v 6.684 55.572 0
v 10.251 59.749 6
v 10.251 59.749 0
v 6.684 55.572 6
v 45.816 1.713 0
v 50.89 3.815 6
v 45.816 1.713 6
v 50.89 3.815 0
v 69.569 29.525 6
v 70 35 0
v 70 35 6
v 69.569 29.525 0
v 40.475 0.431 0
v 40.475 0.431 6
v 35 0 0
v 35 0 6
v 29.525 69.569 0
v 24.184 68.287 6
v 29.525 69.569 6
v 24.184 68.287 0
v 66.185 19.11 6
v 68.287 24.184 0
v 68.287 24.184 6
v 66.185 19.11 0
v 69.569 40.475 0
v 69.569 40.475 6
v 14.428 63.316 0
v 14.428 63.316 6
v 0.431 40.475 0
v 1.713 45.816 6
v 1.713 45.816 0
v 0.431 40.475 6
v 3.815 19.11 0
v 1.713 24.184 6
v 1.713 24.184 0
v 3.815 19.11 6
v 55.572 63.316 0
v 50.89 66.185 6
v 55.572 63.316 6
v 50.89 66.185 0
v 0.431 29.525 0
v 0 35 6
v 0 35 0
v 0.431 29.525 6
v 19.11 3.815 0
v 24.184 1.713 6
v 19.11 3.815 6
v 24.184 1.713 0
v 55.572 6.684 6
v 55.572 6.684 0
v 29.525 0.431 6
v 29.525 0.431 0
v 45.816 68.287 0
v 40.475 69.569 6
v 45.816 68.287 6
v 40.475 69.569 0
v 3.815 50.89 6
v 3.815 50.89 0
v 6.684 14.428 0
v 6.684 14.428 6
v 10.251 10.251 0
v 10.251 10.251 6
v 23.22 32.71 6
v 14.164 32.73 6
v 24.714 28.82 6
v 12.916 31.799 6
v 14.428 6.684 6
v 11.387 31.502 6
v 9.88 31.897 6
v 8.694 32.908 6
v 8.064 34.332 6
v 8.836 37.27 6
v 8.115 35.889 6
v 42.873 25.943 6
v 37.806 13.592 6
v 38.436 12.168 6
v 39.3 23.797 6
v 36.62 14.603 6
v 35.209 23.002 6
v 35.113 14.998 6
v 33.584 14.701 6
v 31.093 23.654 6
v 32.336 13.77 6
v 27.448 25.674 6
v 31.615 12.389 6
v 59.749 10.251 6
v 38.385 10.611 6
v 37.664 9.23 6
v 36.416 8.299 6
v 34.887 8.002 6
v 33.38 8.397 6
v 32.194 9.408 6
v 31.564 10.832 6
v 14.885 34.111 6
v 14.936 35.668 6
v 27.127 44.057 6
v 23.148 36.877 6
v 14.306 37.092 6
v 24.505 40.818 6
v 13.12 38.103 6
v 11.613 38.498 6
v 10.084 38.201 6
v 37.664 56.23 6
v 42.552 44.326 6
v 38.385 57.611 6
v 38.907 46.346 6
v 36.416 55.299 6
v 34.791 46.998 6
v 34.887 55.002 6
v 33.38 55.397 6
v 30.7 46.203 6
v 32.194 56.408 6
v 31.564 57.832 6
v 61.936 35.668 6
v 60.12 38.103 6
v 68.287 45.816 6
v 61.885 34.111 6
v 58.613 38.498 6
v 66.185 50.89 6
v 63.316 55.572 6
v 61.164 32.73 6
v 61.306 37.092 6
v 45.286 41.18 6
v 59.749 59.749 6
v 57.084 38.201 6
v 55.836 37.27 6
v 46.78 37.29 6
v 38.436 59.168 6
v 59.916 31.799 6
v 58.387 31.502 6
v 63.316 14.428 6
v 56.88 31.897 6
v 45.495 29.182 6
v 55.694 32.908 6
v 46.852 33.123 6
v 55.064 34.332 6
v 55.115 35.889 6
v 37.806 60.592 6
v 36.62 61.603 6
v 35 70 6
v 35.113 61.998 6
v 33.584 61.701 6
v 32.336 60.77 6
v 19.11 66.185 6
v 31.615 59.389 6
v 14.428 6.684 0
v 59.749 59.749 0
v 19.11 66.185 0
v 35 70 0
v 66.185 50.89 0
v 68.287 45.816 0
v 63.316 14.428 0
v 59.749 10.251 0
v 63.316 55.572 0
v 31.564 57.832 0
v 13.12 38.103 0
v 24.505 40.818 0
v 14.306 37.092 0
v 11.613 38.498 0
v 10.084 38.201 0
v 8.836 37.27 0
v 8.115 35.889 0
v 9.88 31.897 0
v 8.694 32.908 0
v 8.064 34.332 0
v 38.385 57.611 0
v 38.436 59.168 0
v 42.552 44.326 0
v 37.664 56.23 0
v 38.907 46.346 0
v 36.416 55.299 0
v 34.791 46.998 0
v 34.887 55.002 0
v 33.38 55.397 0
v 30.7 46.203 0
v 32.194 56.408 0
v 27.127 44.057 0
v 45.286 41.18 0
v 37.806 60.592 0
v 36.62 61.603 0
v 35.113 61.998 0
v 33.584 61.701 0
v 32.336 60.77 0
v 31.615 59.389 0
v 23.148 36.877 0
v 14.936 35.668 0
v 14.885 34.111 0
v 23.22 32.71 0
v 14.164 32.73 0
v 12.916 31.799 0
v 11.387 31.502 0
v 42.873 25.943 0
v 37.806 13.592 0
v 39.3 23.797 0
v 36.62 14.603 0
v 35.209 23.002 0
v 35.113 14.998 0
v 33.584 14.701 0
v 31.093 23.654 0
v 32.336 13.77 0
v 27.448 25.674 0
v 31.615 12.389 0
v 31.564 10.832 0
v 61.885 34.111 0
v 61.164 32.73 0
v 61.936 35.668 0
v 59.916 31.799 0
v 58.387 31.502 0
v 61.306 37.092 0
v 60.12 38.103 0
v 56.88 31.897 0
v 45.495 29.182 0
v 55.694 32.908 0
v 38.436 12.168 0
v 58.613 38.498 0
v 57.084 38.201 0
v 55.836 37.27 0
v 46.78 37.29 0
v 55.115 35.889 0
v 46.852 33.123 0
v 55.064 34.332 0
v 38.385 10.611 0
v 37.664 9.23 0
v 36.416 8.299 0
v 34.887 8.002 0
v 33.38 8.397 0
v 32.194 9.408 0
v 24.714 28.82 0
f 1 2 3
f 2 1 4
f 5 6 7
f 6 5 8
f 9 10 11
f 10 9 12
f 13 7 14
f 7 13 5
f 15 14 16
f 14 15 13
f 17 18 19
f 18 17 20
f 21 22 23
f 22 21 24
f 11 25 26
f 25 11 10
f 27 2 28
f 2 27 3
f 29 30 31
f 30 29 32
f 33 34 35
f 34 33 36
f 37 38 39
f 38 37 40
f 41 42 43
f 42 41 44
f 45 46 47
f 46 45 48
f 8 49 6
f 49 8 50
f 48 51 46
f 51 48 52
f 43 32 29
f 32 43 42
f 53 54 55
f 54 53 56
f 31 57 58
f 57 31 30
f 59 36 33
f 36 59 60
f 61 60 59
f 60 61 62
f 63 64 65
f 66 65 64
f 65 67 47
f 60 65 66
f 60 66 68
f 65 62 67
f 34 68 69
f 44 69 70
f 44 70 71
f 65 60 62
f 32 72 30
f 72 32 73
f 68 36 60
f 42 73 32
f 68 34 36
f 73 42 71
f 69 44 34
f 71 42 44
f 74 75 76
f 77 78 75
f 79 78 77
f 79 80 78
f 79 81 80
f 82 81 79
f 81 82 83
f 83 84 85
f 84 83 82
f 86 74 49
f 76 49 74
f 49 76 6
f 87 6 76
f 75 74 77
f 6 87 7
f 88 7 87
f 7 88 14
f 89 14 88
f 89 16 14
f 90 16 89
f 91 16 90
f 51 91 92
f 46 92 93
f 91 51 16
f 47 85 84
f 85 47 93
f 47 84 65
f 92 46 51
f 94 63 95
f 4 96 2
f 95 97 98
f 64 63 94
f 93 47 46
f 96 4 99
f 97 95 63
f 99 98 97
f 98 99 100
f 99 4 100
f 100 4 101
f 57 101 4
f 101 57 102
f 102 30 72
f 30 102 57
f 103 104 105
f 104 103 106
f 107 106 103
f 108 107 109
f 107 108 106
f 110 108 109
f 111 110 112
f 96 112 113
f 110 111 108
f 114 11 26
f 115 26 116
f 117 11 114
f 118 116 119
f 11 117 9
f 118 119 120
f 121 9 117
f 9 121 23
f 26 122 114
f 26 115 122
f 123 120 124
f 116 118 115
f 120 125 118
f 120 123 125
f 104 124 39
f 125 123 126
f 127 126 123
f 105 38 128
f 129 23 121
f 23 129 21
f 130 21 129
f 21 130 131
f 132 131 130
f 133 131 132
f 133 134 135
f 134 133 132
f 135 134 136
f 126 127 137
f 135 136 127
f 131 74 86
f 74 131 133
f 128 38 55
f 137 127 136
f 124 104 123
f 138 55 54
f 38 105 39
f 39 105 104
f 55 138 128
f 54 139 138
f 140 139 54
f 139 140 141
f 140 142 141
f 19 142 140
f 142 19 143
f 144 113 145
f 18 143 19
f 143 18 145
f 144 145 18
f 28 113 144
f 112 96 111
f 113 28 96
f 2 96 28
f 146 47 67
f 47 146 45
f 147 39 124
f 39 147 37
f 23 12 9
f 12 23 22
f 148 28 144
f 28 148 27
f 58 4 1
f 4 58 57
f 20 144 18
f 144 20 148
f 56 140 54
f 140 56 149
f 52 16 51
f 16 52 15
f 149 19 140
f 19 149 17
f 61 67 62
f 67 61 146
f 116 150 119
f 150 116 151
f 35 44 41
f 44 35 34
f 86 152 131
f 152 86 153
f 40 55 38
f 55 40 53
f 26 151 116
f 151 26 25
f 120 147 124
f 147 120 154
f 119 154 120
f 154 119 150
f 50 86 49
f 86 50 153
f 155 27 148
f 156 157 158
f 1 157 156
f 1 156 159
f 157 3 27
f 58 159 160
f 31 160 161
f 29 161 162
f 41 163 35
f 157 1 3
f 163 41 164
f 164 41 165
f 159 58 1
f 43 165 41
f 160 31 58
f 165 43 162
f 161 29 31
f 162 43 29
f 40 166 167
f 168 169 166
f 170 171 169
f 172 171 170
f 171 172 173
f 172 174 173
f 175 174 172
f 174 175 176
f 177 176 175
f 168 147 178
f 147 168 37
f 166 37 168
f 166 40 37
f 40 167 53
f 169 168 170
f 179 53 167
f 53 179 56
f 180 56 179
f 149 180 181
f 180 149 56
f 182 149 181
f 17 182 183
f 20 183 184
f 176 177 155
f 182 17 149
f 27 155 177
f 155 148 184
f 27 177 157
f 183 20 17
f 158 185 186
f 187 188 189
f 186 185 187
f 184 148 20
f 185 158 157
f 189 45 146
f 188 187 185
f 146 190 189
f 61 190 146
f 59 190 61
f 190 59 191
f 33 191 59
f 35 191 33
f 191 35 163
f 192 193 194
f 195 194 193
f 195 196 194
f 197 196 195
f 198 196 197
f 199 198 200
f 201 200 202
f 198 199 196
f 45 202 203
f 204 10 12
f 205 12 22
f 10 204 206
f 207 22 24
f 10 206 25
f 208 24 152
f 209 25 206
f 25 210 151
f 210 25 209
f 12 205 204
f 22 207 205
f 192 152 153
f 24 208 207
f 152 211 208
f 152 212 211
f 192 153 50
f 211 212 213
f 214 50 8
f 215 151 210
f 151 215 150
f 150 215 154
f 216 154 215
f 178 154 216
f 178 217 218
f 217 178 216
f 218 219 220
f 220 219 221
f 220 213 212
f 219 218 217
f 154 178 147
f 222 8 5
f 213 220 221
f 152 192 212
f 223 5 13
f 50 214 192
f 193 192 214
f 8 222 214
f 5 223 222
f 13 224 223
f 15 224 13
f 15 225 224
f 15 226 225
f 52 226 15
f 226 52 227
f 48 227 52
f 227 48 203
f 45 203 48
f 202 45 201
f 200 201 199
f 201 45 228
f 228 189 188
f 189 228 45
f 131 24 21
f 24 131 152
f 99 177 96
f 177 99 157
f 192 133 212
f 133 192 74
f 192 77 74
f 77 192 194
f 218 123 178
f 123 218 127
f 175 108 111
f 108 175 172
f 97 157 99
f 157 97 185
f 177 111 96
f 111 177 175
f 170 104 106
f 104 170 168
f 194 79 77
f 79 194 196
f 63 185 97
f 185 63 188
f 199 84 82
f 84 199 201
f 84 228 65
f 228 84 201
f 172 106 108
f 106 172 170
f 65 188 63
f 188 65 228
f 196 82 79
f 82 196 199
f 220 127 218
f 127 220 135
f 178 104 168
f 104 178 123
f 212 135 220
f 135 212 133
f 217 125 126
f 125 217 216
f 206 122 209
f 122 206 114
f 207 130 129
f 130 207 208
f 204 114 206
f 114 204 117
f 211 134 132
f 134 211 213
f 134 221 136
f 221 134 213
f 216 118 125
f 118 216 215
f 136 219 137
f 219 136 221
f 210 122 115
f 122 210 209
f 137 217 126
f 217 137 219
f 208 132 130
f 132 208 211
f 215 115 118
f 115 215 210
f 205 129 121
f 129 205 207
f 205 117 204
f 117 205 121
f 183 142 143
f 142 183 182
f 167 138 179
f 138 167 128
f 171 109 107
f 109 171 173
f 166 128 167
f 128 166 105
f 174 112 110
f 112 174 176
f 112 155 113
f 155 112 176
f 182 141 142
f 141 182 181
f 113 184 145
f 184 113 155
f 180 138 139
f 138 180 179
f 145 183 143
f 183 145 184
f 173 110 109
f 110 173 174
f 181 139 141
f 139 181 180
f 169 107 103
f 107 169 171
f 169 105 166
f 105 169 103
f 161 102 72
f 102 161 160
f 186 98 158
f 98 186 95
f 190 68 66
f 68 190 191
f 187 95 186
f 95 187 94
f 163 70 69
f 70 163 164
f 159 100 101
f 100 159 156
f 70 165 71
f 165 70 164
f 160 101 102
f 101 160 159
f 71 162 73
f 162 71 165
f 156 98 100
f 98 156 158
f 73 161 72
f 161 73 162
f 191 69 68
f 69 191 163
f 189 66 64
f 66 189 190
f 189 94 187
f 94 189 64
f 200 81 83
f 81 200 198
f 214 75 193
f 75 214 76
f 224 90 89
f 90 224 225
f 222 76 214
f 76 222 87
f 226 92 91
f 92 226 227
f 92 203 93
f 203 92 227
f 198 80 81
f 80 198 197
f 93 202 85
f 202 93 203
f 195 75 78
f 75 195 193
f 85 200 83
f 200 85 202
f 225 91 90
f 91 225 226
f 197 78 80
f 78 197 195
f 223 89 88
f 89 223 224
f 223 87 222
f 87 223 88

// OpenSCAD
$fn = 32;

// ----------------------------------------------------------------------
// Spacer plate: round flange R35, 4 bolts
// ----------------------------------------------------------------------

// --- parameters (mm) ---
bore_r = 12;              // centre bore radius
bolt_r = 3.5;             // bolt hole radius
plate_t = 6;              // plate thickness, Z (extrusion height)
flange_r = 35;            // flange radius
n_bolt = 4;               // bolt hole count
ring_r = 23.5;            // bolt circle radius

profile = [[70, 35], [69.569, 40.475], [68.287, 45.816], [66.185, 50.89], [63.316, 55.572], [59.749, 59.749], [55.572, 63.316], [50.89, 66.185], [45.816, 68.287], [40.475, 69.569], [35, 70], [29.525, 69.569], [24.184, 68.287], [19.11, 66.185], [14.428, 63.316], [10.251, 59.749], [6.684, 55.572], [3.815, 50.89], [1.713, 45.816], [0.431, 40.475], [0, 35], [0.431, 29.525], [1.713, 24.184], [3.815, 19.11], [6.684, 14.428], [10.251, 10.251], [14.428, 6.684], [19.11, 3.815], [24.184, 1.713], [29.525, 0.431], [35, 0], [40.475, 0.431], [45.816, 1.713], [50.89, 3.815], [55.572, 6.684], [59.749, 10.251], [63.316, 14.428], [66.185, 19.11], [68.287, 24.184], [69.569, 29.525]];  // primary outline, 40 points, counter clockwise
void_1 = [[46.78, 37.29], [45.286, 41.18], [42.552, 44.326], [38.907, 46.346], [34.791, 46.998], [30.7, 46.203], [27.127, 44.057], [24.505, 40.818], [23.148, 36.877], [23.22, 32.71], [24.714, 28.82], [27.448, 25.674], [31.093, 23.654], [35.209, 23.002], [39.3, 23.797], [42.873, 25.943], [45.495, 29.182], [46.852, 33.123]];  // centre bore, 18 points
void_2 = [[61.936, 35.668], [61.306, 37.092], [60.12, 38.103], [58.613, 38.498], [57.084, 38.201], [55.836, 37.27], [55.115, 35.889], [55.064, 34.332], [55.694, 32.908], [56.88, 31.897], [58.387, 31.502], [59.916, 31.799], [61.164, 32.73], [61.885, 34.111]];  // bolt hole 1, 14 points
void_3 = [[38.436, 59.168], [37.806, 60.592], [36.62, 61.603], [35.113, 61.998], [33.584, 61.701], [32.336, 60.77], [31.615, 59.389], [31.564, 57.832], [32.194, 56.408], [33.38, 55.397], [34.887, 55.002], [36.416, 55.299], [37.664, 56.23], [38.385, 57.611]];  // bolt hole 2, 14 points
void_4 = [[14.936, 35.668], [14.306, 37.092], [13.12, 38.103], [11.613, 38.498], [10.084, 38.201], [8.836, 37.27], [8.115, 35.889], [8.064, 34.332], [8.694, 32.908], [9.88, 31.897], [11.387, 31.502], [12.916, 31.799], [14.164, 32.73], [14.885, 34.111]];  // bolt hole 3, 14 points
void_5 = [[38.436, 12.168], [37.806, 13.592], [36.62, 14.603], [35.113, 14.998], [33.584, 14.701], [32.336, 13.77], [31.615, 12.389], [31.564, 10.832], [32.194, 9.408], [33.38, 8.397], [34.887, 8.002], [36.416, 8.299], [37.664, 9.23], [38.385, 10.611]];  // bolt hole 4, 14 points

// --- the one profile operation ---
difference() {
  linear_extrude(height = plate_t) polygon(points = profile);
  translate([0, 0, -1])
    linear_extrude(height = plate_t + 2) polygon(points = void_1);
  translate([0, 0, -1])
    linear_extrude(height = plate_t + 2) polygon(points = void_2);
  translate([0, 0, -1])
    linear_extrude(height = plate_t + 2) polygon(points = void_3);
  translate([0, 0, -1])
    linear_extrude(height = plate_t + 2) polygon(points = void_4);
  translate([0, 0, -1])
    linear_extrude(height = plate_t + 2) polygon(points = void_5);
}
